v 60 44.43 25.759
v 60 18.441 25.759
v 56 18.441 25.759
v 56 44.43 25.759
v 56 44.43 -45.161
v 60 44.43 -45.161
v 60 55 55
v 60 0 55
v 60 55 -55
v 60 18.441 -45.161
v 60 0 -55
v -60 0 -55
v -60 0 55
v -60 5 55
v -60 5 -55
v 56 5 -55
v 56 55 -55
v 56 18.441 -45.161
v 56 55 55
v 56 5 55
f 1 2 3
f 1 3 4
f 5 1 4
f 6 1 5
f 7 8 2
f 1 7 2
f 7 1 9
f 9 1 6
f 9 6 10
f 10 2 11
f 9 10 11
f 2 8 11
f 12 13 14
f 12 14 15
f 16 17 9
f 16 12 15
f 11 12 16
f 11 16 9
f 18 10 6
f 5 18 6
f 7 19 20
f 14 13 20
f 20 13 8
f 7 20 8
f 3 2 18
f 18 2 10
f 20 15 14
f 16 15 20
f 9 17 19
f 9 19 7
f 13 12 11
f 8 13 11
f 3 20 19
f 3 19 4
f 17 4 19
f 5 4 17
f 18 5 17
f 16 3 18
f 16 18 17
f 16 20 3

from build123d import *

# Parameters (mm, degrees)
SKETCH1_W           = 120
SKETCH1_H           = 110
BOSS_EXTRUDE1_DEPTH = 5
SKETCH2_W           = 4
SKETCH2_H           = 110
BOSS_EXTRUDE2_DEPTH = 50
CUT_EXTRUDE1_REACH  = 145.003
SKETCH3_W           = 70.920113649
SKETCH3_H           = 25.988088709


with BuildPart() as part:
    # Sketch1 → Boss-Extrude1 (new body)
    with BuildSketch(Plane(origin=(0, 0, 0), x_dir=(1, 0, 0), z_dir=(0, 1, 0))):
        Rectangle(SKETCH1_W, SKETCH1_H)
    extrude(amount=BOSS_EXTRUDE1_DEPTH)

    # Sketch2 → Boss-Extrude2 (add)
    with BuildSketch(Plane(origin=(0, 5, 0), x_dir=(1, 0, 0), z_dir=(0, 1, 0))):
        with Locations((58, 0)):
            Rectangle(SKETCH2_W, SKETCH2_H)
    extrude(amount=BOSS_EXTRUDE2_DEPTH)

    # Sketch3 → Cut-Extrude1 (cut, up to next)
    with BuildSketch(Plane(origin=(60, 0, 0), x_dir=(0, 0, -1), z_dir=(1, 0, 0)), mode=Mode.PRIVATE) as cut_extrude1_sk1:
        with Locations((9.701412532, 31.435505385)):
            Rectangle(SKETCH3_W, SKETCH3_H)
    cut_extrude1_tool1 = extrude(cut_extrude1_sk1.sketch, amount=-CUT_EXTRUDE1_REACH, mode=Mode.PRIVATE) & part.part
    add(cut_extrude1_tool1.solids().sort_by_distance((60, 31.435505, -9.701413))[0], mode=Mode.SUBTRACT)


solid = part.part
